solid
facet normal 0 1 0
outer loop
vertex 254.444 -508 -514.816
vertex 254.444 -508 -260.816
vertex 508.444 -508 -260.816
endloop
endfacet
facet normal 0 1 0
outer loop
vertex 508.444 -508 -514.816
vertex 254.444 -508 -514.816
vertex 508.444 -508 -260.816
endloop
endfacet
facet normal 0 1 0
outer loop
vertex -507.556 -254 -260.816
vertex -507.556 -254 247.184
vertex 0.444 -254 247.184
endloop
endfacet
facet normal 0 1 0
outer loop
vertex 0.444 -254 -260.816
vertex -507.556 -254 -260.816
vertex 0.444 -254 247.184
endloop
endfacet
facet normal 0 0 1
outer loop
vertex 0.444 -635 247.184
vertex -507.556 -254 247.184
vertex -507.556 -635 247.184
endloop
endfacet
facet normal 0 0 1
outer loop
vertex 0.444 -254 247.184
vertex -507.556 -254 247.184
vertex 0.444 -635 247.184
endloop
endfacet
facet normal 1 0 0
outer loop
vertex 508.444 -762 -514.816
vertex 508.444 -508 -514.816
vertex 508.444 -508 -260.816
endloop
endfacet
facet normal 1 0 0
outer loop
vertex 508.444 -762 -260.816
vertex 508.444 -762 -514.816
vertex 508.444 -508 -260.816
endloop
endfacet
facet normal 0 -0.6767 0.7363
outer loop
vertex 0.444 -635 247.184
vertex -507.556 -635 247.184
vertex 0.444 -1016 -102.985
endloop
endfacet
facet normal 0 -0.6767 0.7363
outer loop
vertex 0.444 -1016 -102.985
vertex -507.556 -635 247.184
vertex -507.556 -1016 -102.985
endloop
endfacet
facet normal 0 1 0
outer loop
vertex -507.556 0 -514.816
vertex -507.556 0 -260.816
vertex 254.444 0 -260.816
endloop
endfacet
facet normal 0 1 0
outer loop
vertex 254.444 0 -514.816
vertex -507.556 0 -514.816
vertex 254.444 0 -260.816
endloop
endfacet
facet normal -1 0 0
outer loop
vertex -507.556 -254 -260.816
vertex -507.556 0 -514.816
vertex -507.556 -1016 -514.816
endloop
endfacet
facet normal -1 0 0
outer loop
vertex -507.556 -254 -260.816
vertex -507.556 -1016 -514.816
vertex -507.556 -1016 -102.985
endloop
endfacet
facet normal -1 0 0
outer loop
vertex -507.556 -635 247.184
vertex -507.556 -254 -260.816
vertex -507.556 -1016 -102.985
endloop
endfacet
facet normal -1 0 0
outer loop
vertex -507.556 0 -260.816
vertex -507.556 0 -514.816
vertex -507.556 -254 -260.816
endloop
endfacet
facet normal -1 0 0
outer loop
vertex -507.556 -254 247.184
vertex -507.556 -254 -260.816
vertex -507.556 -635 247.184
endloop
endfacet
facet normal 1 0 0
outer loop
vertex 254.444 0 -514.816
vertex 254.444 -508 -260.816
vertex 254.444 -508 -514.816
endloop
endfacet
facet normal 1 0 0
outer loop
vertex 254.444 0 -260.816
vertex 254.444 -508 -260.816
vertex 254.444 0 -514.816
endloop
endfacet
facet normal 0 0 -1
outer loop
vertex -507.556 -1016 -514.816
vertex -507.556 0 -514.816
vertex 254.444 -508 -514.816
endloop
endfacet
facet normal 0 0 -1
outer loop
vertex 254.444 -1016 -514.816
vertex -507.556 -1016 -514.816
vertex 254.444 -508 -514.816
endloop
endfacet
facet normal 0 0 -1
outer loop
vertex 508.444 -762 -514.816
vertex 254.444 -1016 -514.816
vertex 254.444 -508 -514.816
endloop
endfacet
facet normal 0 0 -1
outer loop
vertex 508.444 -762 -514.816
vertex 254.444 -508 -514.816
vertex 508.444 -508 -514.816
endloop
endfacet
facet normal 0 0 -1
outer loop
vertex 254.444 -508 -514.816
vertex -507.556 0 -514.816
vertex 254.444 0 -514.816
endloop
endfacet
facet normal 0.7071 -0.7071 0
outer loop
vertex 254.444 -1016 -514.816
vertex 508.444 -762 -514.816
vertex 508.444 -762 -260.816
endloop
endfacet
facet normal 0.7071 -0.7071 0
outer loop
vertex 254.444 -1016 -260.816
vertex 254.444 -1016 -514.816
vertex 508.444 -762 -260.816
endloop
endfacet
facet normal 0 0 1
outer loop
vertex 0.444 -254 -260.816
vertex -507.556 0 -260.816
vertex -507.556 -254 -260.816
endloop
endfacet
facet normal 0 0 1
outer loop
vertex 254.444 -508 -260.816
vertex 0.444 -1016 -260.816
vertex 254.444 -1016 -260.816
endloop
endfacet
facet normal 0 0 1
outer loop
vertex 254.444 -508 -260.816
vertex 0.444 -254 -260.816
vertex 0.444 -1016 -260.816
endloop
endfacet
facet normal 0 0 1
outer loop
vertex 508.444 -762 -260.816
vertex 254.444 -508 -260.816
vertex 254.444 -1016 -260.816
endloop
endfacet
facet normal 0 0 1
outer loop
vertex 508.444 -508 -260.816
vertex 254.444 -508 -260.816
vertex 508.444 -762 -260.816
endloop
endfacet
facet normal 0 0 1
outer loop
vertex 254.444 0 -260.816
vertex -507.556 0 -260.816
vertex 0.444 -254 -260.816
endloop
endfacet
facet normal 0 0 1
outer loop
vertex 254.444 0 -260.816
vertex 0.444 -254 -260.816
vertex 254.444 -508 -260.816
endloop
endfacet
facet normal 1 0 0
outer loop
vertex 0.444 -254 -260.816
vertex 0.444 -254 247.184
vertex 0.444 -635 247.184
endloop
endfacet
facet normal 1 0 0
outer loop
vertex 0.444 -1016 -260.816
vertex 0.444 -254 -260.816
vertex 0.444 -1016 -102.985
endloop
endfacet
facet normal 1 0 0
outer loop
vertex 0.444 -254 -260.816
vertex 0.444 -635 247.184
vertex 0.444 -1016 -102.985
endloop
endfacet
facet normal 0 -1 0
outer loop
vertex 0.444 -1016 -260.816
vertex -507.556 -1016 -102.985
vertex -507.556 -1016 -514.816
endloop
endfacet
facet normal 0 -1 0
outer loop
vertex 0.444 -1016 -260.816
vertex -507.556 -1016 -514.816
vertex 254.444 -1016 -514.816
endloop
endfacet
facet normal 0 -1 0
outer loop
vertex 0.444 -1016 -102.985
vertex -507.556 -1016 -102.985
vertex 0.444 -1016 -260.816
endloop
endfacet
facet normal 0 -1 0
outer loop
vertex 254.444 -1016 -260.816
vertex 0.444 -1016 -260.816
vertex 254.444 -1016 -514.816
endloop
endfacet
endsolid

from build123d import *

# Parameters (mm, degrees)
F0_W      = 1016
F0_H      = 762
F1_DEPTH  = 1016
F2_W      = 254
F2_H      = 508
F3_DEPTH  = 1016
F6_DEPTH  = 508
F7_DEPTH  = 25
F9_DEPTH  = 254
F11_DEPTH = 762
F12_SIZE  = 254


with BuildPart() as f1:
    # F0 (on Front) → F1 (new body)
    with BuildSketch(Plane.XZ):
        with Locations((0.4440769553, -133.8159580914)):
            Rectangle(F0_W, F0_H)
    extrude(amount=F1_DEPTH)

    # F2 (on face) → F3 (cut)
    with BuildSketch(Plane.XY.offset(247.1840419086)):
        with Locations((381.4440769553, -254)):
            Rectangle(F2_W, F2_H)
    extrude(amount=-F3_DEPTH, mode=Mode.SUBTRACT)

    # F4 (on face) → F6 (cut)
    with BuildSketch(Plane.XY.offset(247.1840419086)):
        Polygon((0.4440769553, -254), (0.4440769553, -1016), (508.4440769553, -1016), (508.4440769553, -508), (254.4440769553, -508), (254.4440769553, 0), (-507.5559230447, 0), (-507.5559230447, -254), align=None)
    extrude(amount=-F6_DEPTH, mode=Mode.SUBTRACT)

    # F10 (on face) → F11 (cut)
    with BuildSketch(Plane(origin=(-507.5559230447, 0, 0), x_dir=(0, -1, 0), z_dir=(-1, 0, 0))):
        Polygon((1016, -102.9850542545), (1016, 247.1840419086), (635, 247.1840419086), align=None)
    extrude(amount=-F11_DEPTH, mode=Mode.SUBTRACT)

    # F12
    f12_edges = [f1.edges().sort_by_distance(p)[0] for p in [
        (508.444077, -1016, -387.815958),
    ]]
    chamfer(f12_edges, length=F12_SIZE)


with BuildPart() as f7:
    # F5 (on face) → F7 (new body)
    with BuildSketch(Plane.XY.offset(247.1840419086)):
        Polygon((254.4440769553, 0), (-506.6555738449, 0), (-506.6555738449, -254), (0.4440769553, -254), (0.4440769553, -1016), (508.4440769553, -1016), (508.4440769553, -508), (254.4440769553, -508), align=None)
    extrude(amount=F7_DEPTH)

    # F8 (on face) → F9 (cut)
    with BuildSketch(Plane.XY.offset(272.1840419086)):
        Polygon((-506.6555738449, -254), (0.4440769553, -254), (0.4440769553, -1016), (508.4440769553, -1016), (508.4440769553, -508), (254.4440769553, -508), (254.4440769553, 0), (-506.6555738449, 0), align=None)
    extrude(amount=-F9_DEPTH, mode=Mode.SUBTRACT)


solid = f1.part
